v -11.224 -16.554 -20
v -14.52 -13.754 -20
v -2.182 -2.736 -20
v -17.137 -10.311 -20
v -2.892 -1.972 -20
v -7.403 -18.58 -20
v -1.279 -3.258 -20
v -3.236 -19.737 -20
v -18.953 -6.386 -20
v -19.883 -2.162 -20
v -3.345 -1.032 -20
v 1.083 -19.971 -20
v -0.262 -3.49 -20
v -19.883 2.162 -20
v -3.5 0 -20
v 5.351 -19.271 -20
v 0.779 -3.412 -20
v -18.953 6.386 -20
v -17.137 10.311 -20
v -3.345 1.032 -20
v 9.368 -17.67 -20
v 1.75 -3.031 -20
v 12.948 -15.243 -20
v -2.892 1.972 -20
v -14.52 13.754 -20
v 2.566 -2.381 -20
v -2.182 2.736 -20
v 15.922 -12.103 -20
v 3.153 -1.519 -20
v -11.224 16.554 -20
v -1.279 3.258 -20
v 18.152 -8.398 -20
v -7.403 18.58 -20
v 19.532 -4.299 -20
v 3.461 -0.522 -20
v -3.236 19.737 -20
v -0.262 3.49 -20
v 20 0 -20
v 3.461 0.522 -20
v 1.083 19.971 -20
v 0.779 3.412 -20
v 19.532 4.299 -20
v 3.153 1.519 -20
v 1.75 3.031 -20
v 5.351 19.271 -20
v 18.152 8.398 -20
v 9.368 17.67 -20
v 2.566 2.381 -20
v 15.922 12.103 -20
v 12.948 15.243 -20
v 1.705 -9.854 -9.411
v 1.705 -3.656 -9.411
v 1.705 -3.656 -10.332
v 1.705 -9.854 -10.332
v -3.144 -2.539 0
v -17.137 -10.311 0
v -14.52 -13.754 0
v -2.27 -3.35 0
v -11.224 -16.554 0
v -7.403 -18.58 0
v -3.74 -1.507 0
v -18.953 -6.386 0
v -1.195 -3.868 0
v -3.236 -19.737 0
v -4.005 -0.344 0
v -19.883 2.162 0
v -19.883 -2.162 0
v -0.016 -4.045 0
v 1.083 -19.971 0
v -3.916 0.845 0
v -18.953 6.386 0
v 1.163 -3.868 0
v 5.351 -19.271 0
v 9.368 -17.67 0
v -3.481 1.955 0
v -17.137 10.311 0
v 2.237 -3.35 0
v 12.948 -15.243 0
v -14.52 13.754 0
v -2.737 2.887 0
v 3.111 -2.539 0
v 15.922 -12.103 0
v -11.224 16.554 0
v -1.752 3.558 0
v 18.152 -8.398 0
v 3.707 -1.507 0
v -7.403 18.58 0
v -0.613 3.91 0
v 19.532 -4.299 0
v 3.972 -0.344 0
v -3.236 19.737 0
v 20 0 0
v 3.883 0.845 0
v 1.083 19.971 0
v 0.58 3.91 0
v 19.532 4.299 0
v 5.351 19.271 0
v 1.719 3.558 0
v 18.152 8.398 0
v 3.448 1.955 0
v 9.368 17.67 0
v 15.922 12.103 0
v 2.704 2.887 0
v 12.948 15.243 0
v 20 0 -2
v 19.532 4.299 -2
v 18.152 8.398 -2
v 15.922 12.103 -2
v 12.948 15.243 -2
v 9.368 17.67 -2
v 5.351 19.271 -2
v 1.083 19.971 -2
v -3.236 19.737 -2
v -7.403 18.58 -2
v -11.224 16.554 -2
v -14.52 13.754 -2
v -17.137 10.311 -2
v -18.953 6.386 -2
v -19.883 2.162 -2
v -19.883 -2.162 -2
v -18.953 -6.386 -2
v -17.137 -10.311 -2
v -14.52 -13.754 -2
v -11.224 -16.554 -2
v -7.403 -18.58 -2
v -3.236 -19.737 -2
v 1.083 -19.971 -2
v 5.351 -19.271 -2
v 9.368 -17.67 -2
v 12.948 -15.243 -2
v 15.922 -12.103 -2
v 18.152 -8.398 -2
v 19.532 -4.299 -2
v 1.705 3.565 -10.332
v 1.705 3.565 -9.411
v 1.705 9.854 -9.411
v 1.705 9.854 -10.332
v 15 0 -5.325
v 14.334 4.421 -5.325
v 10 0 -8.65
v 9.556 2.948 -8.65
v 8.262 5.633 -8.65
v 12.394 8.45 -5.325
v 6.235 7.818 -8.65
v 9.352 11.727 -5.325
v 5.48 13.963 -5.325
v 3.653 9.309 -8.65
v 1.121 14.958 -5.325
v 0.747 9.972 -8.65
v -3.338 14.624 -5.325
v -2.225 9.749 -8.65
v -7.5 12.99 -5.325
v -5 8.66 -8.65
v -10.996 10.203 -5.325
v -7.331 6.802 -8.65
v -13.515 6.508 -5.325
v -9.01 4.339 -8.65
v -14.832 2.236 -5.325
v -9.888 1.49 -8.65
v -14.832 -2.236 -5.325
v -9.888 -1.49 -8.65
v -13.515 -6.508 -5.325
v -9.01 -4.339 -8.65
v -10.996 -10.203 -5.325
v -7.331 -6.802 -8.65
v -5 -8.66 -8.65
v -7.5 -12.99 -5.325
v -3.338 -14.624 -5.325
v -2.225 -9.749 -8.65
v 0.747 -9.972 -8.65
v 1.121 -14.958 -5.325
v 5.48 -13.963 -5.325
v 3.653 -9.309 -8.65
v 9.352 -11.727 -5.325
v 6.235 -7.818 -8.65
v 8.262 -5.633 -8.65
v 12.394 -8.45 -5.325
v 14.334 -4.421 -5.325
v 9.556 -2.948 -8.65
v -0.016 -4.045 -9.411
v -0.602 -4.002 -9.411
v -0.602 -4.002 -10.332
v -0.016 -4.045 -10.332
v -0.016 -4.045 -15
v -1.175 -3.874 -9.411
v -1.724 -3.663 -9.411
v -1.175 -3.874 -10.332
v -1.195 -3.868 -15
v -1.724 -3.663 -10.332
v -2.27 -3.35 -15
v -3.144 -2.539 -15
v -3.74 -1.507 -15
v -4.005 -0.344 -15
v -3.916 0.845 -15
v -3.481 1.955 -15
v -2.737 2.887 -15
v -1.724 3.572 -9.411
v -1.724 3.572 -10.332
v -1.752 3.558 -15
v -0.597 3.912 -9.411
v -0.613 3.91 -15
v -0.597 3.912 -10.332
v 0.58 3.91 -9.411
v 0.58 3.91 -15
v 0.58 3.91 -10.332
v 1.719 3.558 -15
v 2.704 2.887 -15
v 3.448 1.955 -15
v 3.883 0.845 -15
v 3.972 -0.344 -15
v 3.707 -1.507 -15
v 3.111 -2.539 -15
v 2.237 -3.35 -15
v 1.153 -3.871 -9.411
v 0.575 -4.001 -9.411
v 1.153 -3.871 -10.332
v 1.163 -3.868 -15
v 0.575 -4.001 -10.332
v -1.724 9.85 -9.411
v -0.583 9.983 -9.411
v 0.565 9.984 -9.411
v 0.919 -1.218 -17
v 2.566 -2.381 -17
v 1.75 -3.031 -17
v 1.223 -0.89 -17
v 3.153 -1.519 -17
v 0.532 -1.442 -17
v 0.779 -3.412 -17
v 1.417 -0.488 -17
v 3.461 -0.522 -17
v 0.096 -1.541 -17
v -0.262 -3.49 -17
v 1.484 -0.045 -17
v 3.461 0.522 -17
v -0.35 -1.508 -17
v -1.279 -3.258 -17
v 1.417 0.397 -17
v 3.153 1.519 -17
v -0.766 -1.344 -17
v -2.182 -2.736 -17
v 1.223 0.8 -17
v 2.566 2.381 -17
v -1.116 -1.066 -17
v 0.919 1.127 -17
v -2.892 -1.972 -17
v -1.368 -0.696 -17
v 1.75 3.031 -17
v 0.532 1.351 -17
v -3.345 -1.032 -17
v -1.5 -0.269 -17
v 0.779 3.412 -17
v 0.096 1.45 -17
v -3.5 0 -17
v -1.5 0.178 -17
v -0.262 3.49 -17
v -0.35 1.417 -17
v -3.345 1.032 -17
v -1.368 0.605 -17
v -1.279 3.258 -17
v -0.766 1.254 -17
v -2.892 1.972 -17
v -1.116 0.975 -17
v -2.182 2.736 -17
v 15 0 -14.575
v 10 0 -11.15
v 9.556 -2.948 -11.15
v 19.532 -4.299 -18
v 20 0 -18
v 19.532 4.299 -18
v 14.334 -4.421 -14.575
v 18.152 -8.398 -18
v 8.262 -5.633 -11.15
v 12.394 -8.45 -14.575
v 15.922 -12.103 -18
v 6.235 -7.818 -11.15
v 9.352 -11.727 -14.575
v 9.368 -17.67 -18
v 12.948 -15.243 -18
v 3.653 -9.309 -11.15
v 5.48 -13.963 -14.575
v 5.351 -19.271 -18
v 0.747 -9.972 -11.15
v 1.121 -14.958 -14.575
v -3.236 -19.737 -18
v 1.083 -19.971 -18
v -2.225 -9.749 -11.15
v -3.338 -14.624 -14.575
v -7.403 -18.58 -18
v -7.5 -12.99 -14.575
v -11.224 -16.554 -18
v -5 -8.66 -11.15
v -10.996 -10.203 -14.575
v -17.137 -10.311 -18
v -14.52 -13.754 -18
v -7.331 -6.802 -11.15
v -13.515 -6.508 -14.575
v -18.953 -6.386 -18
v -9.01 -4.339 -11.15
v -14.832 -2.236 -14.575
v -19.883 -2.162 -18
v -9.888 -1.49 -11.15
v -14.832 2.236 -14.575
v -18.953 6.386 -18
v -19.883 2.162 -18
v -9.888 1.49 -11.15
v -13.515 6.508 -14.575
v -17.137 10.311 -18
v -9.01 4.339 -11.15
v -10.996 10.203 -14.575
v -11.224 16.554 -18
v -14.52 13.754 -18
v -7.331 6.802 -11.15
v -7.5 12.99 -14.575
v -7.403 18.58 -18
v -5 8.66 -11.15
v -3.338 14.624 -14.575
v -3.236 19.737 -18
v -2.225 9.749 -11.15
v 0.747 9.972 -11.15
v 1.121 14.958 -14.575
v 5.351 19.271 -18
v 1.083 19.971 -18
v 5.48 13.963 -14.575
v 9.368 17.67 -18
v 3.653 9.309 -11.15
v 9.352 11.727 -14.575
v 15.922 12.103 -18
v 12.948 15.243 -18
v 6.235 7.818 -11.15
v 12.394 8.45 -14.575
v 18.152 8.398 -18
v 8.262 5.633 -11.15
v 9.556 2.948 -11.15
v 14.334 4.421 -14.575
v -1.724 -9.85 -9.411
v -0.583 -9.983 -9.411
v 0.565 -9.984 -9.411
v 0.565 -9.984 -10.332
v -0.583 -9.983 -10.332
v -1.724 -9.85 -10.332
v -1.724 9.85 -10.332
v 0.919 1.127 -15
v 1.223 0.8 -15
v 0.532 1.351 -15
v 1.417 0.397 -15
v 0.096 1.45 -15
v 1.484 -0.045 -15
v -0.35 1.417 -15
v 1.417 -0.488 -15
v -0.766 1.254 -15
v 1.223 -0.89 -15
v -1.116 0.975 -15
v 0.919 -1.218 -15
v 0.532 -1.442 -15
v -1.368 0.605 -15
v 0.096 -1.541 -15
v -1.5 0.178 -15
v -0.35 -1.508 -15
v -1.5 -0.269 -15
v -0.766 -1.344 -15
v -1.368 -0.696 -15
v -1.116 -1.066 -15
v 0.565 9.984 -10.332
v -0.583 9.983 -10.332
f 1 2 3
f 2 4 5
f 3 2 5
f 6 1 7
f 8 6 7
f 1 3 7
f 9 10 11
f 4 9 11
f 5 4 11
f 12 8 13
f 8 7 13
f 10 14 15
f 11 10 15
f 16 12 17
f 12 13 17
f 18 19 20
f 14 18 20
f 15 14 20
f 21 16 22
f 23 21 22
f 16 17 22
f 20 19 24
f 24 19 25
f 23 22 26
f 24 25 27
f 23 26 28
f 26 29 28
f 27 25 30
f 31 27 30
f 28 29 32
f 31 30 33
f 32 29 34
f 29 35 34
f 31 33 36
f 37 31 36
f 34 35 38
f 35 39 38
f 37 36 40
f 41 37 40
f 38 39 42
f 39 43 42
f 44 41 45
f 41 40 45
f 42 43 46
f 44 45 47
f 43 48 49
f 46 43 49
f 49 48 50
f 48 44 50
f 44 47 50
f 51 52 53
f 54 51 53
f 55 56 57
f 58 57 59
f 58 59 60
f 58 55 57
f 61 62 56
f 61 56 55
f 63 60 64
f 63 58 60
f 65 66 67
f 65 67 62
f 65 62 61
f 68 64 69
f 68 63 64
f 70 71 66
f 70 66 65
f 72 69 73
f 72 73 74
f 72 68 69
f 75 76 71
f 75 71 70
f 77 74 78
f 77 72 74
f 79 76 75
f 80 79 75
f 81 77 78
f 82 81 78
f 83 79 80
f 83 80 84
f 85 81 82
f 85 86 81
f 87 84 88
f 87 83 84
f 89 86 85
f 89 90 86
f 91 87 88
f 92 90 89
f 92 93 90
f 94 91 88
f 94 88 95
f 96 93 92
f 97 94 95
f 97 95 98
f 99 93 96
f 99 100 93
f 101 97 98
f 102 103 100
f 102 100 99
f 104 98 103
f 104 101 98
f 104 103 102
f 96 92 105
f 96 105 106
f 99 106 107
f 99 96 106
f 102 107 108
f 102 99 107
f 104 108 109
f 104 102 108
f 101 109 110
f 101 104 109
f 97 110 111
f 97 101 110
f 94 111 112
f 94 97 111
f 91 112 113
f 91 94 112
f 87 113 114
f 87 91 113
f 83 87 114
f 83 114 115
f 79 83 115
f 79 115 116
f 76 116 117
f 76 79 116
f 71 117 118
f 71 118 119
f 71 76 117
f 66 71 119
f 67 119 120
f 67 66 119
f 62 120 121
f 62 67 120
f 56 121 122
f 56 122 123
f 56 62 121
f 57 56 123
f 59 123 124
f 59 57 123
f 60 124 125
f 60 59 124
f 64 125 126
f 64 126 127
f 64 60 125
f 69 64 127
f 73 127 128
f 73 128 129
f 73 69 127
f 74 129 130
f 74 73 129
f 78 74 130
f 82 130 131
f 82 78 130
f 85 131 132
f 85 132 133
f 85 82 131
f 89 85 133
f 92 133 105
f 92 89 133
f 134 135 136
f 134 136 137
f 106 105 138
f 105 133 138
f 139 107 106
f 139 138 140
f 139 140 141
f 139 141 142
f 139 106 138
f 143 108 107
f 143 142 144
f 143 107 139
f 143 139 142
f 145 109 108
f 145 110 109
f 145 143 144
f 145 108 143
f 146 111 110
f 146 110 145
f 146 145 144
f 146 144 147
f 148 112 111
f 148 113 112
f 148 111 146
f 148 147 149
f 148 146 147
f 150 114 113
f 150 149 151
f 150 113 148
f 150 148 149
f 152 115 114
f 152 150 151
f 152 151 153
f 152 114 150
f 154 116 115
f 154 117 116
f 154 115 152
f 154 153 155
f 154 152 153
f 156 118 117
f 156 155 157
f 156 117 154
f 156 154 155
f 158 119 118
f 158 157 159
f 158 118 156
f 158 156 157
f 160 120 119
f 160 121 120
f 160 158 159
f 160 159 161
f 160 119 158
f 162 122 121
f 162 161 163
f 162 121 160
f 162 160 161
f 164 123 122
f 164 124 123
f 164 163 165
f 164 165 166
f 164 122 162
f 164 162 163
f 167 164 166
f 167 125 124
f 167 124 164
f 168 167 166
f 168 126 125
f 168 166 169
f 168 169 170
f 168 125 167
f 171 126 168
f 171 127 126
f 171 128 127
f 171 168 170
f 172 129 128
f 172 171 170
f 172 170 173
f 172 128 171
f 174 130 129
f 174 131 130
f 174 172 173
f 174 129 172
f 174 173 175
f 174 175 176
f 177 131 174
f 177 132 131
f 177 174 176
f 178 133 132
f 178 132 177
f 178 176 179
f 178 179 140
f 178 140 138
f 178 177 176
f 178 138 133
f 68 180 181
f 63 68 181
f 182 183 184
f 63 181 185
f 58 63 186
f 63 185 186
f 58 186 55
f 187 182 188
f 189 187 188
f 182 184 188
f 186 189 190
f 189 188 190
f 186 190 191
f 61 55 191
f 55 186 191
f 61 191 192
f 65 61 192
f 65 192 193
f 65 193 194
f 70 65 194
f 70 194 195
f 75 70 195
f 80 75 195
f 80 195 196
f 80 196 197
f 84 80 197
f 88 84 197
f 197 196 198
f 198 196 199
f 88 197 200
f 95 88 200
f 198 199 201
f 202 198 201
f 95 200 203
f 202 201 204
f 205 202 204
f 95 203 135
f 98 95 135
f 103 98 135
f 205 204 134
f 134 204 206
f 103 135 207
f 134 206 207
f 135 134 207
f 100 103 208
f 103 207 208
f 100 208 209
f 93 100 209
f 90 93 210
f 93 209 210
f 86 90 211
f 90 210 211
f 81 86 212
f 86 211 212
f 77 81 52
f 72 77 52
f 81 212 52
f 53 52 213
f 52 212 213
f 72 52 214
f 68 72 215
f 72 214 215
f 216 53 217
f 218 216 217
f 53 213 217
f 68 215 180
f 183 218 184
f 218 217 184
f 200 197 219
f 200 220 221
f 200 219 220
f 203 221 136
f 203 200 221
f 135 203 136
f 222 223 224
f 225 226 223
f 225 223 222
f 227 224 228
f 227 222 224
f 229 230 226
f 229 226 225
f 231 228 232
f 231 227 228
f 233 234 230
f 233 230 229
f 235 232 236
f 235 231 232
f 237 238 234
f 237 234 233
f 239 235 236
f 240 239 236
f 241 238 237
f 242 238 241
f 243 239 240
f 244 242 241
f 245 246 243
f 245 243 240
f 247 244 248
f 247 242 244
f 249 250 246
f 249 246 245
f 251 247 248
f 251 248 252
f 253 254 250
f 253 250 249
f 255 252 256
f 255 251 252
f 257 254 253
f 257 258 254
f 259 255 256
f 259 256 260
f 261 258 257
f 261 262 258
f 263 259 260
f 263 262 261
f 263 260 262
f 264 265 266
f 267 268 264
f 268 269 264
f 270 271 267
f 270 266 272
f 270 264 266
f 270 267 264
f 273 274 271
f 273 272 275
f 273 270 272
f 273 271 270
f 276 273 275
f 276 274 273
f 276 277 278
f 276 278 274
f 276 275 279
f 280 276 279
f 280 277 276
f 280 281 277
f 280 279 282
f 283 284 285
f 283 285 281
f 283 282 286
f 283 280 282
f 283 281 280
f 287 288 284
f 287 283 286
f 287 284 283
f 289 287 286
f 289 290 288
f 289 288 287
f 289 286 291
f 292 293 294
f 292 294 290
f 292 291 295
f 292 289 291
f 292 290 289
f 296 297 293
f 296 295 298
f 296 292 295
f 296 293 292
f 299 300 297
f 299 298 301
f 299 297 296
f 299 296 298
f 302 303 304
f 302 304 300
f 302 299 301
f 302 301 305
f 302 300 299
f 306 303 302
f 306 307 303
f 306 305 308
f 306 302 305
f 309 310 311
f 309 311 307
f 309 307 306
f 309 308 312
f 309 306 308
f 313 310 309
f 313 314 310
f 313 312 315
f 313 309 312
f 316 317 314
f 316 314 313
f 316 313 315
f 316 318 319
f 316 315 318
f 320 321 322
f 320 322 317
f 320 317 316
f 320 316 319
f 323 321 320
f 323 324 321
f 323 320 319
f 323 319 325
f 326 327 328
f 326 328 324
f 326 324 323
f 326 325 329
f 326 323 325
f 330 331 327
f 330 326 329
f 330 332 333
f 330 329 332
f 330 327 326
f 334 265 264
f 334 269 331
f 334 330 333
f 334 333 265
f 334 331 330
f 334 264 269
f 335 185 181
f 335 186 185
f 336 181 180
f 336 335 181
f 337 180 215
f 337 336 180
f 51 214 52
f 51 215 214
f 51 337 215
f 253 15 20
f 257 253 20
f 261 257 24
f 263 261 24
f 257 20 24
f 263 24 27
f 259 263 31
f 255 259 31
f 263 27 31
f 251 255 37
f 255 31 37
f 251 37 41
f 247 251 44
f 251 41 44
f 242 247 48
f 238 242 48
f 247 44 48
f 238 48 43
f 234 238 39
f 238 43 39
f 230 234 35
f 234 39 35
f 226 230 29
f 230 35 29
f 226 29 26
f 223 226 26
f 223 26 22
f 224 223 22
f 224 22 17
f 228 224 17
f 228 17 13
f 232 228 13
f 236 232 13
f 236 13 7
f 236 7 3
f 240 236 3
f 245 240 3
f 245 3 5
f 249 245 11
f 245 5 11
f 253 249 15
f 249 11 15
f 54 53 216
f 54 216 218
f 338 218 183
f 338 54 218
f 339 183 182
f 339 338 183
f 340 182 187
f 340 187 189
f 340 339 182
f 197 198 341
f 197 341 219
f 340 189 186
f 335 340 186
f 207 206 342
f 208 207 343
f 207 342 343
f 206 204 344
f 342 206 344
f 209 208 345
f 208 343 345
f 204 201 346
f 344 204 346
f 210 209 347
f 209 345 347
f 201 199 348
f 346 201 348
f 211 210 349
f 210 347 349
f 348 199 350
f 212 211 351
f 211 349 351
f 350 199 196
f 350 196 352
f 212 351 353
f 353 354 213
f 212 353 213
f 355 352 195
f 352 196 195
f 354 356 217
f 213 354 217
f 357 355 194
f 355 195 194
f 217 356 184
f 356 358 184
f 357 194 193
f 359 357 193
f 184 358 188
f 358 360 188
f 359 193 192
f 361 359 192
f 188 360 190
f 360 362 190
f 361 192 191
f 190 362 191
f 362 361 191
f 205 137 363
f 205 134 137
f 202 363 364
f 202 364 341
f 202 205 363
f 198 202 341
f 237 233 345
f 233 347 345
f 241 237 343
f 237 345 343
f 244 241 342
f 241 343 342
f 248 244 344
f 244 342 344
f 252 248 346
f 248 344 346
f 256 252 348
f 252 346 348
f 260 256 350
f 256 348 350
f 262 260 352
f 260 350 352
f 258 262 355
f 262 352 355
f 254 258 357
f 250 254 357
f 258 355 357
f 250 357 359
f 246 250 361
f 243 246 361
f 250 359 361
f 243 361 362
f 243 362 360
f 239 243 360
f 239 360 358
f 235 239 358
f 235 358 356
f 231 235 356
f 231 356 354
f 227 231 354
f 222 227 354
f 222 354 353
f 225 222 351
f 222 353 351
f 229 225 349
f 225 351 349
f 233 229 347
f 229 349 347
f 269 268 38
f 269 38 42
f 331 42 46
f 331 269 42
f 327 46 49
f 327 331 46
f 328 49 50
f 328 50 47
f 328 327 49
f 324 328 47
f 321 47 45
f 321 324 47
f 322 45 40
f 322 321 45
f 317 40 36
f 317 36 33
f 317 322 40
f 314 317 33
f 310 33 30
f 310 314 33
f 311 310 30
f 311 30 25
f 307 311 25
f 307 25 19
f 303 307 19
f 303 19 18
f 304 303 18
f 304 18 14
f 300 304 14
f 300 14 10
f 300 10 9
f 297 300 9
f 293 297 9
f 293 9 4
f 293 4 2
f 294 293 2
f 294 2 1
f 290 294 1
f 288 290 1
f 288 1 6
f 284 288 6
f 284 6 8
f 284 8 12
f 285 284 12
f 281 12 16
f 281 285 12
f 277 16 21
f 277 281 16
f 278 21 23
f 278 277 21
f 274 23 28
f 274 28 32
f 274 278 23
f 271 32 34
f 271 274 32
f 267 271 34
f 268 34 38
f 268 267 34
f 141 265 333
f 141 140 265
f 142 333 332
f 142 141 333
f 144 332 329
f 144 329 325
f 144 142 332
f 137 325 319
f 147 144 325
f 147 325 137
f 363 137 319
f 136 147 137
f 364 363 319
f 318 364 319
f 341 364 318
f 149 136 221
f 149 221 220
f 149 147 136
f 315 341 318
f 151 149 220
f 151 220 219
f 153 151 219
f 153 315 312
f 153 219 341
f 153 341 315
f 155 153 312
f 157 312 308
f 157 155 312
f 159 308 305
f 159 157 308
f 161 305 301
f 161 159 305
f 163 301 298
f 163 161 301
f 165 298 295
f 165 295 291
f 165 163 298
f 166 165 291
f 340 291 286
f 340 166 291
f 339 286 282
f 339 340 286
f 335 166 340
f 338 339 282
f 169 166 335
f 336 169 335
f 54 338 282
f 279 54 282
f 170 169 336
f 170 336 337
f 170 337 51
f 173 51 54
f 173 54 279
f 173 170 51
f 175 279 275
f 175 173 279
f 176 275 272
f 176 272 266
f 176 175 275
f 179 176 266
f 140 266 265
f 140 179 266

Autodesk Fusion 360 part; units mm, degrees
sketch "Sketch1" plane through (0, 0, 0) normal (0, 1, 0) x (1, 0, 0)
  line L0 (0, 20) -> (20, 20)
  line L1 (20, 0) -> (0, 0)
  line L2 (0, 20) -> (0, 0)
  line L3 (10, 11.15) -> (10, 8.65)
  line L4 (20, 20) -> (20, 18)
  line L5 (20, 18) -> (10, 11.15)
  line L6 (10, 8.65) -> (20, 2)
  line L7 (20, 2) -> (20, 0)
  dimension "d3" = 20
  dimension "d4" = 20
  dimension "d5" = 10
  dimension "d7" = 2
  dimension "d9" = 2.5
  dimension "d18" = 8.85
revolve "Revolve1" add sketch "Sketch1" angle 360 about axis through (0, 0, 1.75) along (0, 0, 1)
hole "Hole1" at (-0.0164, -0.0454, 0) direction (0, 0, -1) diameter 8 depth 15 tip angle 180
sketch "Sketch2" plane through (0, 0, 0) normal (0, 0, 1) x (1, 0, 0)
sketch "Sketch3" plane through (0, 0, -15) normal (0, 0, 1) x (1, 0, 0)
  circle A0 centre (-0.0164, -0.0454) radius 4
  circle A1 centre (-0.0164, -0.0454) radius 1.5
  dimension "d15" = 3
extrude "Extrude1" cut sketch "Sketch3" against normal blind 17 contours A1
sketch "Sketch4" plane through (0, 0, -20) normal (0, 0, -1) x (-1, 0, 0)
  circle A0 centre (0, 0) radius 20
  circle A1 centre (0, 0) radius 3.5
  circle A2 centre (0.0164, -0.0454) radius 1.5
  dimension "d19" = 7
extrude "Extrude2" cut sketch "Sketch4" against normal blind 3 contours A1 | A2
sketch "Sketch5" plane through (0, 0, 0) normal (0, 1, 0) x (1, 0, 0)
  line L0 (-1.7235, 9.4108) -> (1.7051, 9.4108)
  line L1 (1.7051, 9.4108) -> (1.7051, 10.3321)
  line L2 (1.7051, 10.3321) -> (-1.7235, 10.3321)
  line L3 (-1.7235, 10.3321) -> (-1.7235, 9.4108)
extrude "Extrude3" cut sketch "Sketch5" along normal blind 30 and the other way blind 15
